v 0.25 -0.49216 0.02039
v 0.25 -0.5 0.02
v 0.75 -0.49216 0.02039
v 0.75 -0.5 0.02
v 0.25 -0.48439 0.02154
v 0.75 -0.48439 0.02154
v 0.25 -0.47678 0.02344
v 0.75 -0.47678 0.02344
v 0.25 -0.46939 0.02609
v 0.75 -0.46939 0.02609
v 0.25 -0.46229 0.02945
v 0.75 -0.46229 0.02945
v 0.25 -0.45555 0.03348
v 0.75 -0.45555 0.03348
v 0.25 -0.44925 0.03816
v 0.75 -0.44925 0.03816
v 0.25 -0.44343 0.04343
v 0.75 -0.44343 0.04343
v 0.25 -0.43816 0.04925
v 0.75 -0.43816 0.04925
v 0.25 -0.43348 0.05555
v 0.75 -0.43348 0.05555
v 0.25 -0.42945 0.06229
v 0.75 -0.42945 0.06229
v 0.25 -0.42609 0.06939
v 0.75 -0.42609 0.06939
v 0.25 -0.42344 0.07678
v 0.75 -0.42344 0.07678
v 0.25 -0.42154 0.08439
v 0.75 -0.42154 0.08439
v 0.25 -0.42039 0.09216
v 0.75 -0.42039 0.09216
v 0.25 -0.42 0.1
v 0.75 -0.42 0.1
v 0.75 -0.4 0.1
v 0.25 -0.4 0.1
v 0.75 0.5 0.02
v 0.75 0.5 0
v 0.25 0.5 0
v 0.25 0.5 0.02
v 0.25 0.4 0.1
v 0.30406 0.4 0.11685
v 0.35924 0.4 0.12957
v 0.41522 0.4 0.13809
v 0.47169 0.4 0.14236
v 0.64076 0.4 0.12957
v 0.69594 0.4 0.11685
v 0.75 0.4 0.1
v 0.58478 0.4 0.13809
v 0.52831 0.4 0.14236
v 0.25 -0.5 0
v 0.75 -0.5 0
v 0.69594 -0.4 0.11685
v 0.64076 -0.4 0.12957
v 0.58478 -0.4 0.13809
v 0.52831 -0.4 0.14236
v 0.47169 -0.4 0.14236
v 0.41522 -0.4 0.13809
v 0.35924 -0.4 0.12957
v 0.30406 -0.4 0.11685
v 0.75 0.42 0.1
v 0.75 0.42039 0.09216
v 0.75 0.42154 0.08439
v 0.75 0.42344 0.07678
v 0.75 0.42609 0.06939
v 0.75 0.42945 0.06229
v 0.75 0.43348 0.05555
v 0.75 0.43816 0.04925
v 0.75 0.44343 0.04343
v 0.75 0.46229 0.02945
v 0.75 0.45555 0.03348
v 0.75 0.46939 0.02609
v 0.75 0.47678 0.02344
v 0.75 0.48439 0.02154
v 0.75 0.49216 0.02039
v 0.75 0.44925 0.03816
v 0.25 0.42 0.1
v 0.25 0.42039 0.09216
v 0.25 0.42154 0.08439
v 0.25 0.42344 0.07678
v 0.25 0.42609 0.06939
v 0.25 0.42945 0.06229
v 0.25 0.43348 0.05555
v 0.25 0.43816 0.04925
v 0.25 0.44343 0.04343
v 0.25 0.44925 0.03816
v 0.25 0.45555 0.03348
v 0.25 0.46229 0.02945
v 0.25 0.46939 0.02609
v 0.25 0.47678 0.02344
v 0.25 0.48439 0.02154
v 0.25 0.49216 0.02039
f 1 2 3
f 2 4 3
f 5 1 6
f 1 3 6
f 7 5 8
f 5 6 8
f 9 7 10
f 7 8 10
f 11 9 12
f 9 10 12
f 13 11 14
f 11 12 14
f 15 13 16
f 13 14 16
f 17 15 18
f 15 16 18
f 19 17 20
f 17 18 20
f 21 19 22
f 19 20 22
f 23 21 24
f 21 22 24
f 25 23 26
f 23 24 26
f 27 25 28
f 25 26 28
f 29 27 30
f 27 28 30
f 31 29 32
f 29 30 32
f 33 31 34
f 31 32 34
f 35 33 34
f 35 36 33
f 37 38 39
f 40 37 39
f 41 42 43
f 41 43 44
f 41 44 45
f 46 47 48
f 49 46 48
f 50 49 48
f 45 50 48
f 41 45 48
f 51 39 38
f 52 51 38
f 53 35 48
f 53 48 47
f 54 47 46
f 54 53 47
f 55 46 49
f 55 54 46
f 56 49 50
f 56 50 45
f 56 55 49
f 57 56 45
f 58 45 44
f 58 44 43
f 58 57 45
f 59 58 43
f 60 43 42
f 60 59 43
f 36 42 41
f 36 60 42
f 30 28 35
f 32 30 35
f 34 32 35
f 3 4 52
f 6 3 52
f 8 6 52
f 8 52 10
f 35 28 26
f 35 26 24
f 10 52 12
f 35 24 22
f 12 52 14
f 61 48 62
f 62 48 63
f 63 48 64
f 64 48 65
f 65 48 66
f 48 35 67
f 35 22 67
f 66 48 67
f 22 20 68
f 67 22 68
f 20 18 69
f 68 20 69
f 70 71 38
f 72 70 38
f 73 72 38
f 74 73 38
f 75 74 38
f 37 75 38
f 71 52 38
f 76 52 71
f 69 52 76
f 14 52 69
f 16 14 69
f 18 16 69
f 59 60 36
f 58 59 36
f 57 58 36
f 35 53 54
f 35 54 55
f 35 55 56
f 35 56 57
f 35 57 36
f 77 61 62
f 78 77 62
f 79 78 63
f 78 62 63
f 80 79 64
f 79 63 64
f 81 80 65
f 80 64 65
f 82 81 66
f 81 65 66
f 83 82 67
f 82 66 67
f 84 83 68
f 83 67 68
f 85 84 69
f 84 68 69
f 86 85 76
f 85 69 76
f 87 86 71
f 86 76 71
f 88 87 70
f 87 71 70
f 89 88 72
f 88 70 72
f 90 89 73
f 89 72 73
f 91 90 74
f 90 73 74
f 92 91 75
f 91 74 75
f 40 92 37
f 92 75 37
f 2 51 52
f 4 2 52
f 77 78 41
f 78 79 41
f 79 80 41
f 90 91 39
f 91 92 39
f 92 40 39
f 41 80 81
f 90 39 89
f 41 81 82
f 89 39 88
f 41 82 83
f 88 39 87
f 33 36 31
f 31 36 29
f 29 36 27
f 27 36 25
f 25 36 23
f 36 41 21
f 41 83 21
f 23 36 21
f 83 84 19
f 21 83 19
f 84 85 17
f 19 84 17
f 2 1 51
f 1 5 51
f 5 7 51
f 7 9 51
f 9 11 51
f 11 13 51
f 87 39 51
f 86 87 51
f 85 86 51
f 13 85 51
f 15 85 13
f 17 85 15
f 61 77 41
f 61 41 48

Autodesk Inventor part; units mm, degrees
ref_plane "YZ Plane" through (0, 0, 0) normal (1, 0, 0) x (0, 1, 0)
sketch "스케치1" plane through (0, 0, 0) normal (0, 0, 1) x (1, 0, 0)
  line L0 (-0.15, 0) -> (0.9, 0) construction
  line L1 (0, -0.7) -> (0, 0.7) construction
  line L2 (0.25, -0.5) -> (0.75, -0.5)
  line L3 (0.75, -0.5) -> (0.75, 0.5)
  line L4 (0.75, 0.5) -> (0.25, 0.5)
  line L5 (0.25, 0.5) -> (0.25, -0.5)
  point P0 (0, 0)
  point P1 (0.5, -0.5)
  dimension "d7" = 0.5
  dimension "d8" = 1
  dimension "d9" = 0.25
extrude "돌출1" add sketch "스케치1" along normal blind 0.1
sketch "스케치3" plane through (0.25, 0.5, 0) normal (0, 1, 0) x (1, 0, 0)
  line L0 (-0.25, 0.7571) -> (-0.25, -0.2929) construction
  line L1 (-0.4, 0) -> (0.65, 0) construction
  line L2 (0.5, 0) -> (0, 0) projected
  line L3 (0, 0) -> (0, -0.1) projected
  line L4 (0.5, -0.1) -> (0, -0.1) projected
  line L5 (0.5, 0) -> (0.5, -0.1) projected
  arc A0 (0, -0.1) -> (0.5, -0.1) centre (0.25, 0.6071) ccw
  line L6 (0.25, -0.1) -> (0.25, 0.4799) construction
  point P0 (-0.25, 0)
  dimension "d10" = 0.75
sketch "스케치5" plane through (0, 0, 0.1) normal (0, 0, 1) x (1, 0, 0)
  line L0 (0.75, -0.5) -> (0.75, 0.5) projected
  line L1 (0.75, 0.5) -> (0.25, 0.5) projected
  line L2 (0.25, 0.5) -> (0.25, -0.5) projected
  line L3 (0.25, -0.5) -> (0.75, -0.5) projected
  line L4 (-0.15, 0) -> (0.9, 0) construction
  line L5 (0, -0.7) -> (0, 0.7) construction
  line L6 (-0.15, 0) -> (0.9, 0) construction
  line L7 (0, 0.7) -> (0, -0.7) construction
  line L8 (0.75, 0.4) -> (0.25, 0.4)
  line L9 (0.75, -0.4) -> (0.25, -0.4)
  point P0 (0, 0)
  dimension "d18" = 1
  dimension "d19" = 0.4
sketch "스케치6" plane through (0.75, -0.5, 0) normal (1, 0, 0) x (0, 0, -1)
  line L0 (0, 0) -> (0, 1) projected
  line L1 (0, 1) -> (-0.1, 1) projected
  line L2 (-0.1, 0) -> (-0.1, 1) projected
  line L3 (0, 0) -> (-0.1, 0) projected
  line L4 (0, 0.5) -> (-0.1, 0.5) construction
  line L5 (0, 0.92) -> (-0.1, 0.92)
  arc A0 (-0.1, 0.92) -> (-0.02, 1) centre (-0.1, 1) ccw
  arc A1 (-0.02, 0) -> (-0.1, 0.08) centre (-0.1, 0) ccw
  point P0 (-0.05, 0.5)
  point P1 (-0.05, 0.92)
  point P2 (-0.02, 0)
  point P3 (-0.1, 0.08)
  dimension "d20" = 0.42
extrude "돌출5" cut sketch "스케치6" against normal up to surface (0.5 mm away) contours L3 L2 A1 | L2 L1 A0
ref_plane "작업 평면1" through (0.25, -0.4, 0) normal (0, -1, 0) x (1, 0, 0)
sketch "스케치7" plane through (0.25, -0.4, 0) normal (0, -1, 0) x (1, 0, 0)
  arc A0 (0.5, 0.1) -> (0, 0.1) centre (0.25, -0.6071) ccw projected
  line L0 (0, 0.1) -> (0.5, 0.1) projected
  point P0 (-0.25, 0)
ref_plane "작업 평면2" through (0.25, 0.4, 0) normal (0, 1, 0) x (1, 0, 0)
extrude "돌출6" add sketch "스케치7" against normal up to surface (0.8 mm away)
properties part number "flat_surface_1"
